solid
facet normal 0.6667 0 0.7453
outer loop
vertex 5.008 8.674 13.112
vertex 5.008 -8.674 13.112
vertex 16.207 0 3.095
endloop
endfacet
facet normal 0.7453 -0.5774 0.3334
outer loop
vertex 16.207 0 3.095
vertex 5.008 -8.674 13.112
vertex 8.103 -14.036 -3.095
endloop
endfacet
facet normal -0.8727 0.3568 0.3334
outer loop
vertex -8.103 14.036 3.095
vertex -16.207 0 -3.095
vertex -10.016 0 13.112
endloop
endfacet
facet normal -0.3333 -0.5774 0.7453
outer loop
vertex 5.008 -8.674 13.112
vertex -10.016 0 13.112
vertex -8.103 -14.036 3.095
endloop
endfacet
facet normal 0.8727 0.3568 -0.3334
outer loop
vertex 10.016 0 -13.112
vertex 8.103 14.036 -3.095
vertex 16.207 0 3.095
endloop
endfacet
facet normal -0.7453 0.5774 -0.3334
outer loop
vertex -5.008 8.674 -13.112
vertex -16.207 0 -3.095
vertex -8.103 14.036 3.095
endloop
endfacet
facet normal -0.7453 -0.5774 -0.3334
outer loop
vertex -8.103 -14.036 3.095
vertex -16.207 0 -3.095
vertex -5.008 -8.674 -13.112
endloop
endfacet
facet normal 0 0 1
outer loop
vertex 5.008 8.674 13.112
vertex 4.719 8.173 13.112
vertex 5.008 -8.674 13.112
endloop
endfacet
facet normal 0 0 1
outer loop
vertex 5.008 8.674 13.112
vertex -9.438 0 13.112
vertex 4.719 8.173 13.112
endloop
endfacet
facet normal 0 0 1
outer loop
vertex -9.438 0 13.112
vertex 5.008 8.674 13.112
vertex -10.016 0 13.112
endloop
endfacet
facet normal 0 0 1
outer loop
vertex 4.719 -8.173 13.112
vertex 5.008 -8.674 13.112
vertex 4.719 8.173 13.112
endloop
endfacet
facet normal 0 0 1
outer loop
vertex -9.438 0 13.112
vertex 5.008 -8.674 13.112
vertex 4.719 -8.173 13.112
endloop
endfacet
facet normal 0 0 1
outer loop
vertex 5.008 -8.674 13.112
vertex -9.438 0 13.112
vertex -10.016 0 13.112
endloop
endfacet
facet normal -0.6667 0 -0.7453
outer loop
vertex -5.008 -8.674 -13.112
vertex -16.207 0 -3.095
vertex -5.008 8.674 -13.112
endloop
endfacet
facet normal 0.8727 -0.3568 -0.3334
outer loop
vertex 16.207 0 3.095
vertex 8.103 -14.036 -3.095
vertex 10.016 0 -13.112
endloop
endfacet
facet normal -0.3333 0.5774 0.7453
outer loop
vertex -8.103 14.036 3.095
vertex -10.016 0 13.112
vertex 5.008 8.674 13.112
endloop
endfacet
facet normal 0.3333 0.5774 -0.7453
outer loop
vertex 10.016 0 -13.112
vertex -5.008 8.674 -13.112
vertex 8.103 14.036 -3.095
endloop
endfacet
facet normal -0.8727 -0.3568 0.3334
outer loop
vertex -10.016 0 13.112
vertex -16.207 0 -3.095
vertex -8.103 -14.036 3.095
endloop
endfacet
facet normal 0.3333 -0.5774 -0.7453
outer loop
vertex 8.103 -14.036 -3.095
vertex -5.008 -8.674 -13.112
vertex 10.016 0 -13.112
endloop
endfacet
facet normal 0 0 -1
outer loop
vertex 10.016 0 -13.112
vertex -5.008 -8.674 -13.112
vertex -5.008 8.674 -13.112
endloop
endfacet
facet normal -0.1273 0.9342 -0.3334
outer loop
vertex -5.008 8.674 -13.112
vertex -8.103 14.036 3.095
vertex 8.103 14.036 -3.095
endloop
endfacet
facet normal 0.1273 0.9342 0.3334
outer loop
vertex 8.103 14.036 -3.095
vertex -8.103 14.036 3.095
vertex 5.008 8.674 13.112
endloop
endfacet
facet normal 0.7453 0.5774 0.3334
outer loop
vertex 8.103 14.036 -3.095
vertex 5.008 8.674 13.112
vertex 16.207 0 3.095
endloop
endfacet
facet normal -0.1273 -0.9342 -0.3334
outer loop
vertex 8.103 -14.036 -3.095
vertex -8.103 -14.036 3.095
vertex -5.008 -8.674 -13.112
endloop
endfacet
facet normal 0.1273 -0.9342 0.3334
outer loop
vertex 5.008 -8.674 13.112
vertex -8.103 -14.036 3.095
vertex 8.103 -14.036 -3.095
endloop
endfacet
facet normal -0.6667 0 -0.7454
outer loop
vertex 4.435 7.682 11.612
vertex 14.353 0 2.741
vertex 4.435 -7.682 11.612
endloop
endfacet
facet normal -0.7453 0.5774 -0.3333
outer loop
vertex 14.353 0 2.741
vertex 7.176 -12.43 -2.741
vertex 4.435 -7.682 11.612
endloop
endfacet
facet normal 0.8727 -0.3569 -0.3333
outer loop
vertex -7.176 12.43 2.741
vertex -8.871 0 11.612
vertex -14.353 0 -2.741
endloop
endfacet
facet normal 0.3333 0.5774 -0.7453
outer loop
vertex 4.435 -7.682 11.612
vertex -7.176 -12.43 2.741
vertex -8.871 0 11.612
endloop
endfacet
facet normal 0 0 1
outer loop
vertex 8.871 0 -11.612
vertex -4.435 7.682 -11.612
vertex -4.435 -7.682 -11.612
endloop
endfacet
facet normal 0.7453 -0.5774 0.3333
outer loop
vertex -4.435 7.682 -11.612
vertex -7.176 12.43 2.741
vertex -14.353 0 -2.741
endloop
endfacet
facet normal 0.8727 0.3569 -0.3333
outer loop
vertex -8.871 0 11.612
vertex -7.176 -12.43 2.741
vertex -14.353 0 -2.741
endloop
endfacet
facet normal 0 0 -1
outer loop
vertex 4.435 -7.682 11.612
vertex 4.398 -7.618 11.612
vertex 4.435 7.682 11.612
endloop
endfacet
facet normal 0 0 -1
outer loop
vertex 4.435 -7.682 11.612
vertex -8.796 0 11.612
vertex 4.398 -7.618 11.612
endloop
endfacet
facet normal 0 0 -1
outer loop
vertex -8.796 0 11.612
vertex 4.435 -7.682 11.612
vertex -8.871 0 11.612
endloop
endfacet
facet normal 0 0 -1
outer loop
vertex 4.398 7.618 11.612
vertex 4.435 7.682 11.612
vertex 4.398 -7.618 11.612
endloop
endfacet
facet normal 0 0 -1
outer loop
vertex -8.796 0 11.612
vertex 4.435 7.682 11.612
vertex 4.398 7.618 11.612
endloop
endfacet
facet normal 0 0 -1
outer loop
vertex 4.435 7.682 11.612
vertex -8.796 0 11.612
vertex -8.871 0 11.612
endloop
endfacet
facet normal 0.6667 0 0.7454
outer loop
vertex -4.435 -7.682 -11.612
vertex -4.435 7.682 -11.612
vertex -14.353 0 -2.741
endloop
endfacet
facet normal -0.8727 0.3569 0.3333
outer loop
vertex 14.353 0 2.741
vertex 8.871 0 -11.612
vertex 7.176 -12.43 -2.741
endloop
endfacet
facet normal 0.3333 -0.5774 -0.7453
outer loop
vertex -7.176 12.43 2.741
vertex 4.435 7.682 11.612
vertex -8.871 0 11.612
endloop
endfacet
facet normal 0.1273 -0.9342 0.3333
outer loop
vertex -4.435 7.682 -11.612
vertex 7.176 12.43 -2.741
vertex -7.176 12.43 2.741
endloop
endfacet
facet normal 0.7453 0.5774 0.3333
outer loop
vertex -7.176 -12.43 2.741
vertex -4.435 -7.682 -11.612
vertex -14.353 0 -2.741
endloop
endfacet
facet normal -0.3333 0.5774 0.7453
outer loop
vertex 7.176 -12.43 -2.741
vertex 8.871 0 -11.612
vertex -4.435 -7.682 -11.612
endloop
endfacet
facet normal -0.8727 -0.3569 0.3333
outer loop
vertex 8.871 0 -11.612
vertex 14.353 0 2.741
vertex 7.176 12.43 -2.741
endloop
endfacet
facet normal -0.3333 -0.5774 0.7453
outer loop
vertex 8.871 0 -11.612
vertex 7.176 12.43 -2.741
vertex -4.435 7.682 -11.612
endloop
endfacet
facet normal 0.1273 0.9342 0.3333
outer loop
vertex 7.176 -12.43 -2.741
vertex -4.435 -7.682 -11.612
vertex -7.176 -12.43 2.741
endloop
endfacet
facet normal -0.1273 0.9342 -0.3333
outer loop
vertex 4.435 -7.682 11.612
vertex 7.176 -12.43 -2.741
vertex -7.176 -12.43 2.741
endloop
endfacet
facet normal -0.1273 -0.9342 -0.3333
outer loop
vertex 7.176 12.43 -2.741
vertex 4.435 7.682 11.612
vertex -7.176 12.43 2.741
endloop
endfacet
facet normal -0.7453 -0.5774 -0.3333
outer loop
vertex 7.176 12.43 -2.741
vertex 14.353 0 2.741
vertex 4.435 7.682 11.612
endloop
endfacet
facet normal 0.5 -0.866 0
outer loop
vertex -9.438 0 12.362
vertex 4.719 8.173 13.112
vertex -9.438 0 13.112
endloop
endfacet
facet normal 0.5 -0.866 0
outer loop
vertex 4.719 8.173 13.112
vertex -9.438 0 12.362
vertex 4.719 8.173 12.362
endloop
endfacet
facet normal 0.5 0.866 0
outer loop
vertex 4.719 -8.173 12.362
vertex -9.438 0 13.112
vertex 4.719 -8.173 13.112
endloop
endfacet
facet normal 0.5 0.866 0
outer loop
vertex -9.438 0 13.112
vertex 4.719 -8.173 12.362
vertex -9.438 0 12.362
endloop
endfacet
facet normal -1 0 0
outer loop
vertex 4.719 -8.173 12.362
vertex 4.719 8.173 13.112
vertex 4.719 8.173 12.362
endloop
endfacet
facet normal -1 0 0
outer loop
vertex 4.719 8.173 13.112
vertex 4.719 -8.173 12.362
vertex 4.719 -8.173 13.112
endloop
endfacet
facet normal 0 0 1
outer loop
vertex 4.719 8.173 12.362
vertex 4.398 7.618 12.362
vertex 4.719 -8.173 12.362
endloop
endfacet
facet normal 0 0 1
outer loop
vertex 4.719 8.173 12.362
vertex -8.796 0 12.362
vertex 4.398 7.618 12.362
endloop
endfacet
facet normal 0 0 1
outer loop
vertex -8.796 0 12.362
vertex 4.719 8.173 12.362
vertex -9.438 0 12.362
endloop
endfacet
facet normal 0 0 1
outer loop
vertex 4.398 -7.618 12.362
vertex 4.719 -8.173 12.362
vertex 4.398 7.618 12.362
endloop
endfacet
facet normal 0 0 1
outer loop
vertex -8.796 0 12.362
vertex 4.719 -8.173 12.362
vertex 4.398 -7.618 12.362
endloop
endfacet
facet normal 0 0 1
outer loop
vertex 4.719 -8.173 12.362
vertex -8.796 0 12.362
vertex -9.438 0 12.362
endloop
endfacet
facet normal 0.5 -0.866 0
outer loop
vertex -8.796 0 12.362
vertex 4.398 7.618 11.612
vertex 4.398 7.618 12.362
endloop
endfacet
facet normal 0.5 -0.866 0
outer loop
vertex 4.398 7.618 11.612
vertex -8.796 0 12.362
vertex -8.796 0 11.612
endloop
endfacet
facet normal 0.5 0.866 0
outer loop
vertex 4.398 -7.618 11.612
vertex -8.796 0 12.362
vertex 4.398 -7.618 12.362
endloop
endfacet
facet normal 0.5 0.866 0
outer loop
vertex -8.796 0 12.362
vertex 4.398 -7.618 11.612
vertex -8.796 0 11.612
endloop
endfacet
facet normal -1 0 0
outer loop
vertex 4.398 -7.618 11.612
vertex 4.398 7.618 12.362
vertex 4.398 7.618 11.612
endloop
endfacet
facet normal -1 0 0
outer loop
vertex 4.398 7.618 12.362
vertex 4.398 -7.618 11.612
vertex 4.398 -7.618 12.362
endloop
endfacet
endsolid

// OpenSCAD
arete = 17.349;
angle = 20.905;
paroi = 1.5;
echelleReductionAjustementBouchon = 0.935;
r = 0.19; // résolution d'impression sur l'axe Z
ico_sch = [3,5];
Cpi = 3.14159;
Cphi = (1+sqrt(5))/2;
Cepsilon = 0.00000001;

function ico_ext_radius(a) = 
    a*1/4*(sqrt(10+2*sqrt(5)));
    
function ico_int_radius(a) = 
    a/12*(3*sqrt(3)+sqrt(15));
    
function ico_arete_from(int_radius) = 
    int_radius*12/(3*sqrt(3)+sqrt(15));
    
externalRadius = ico_ext_radius(arete);
internalRadius = ico_ext_radius( 
                    ico_arete_from(
                        ico_int_radius(arete)-paroi));
                        
echo(externalRadius); 
echo(internalRadius);

//ico_creux();
//decoupe_bouchon();
corps_ouvert();
//bouchon();
//trou();

module corps_ouvert() {
    //rotate([180, 0, 0])
	difference() {
		ico_creux();
		decoupe_bouchon();
	}
}

module bouchon(version) {
    //rotate([180, 0, 0])
	scale([echelleReductionAjustementBouchon, echelleReductionAjustementBouchon, 0.98])
	difference () {
        intersection() {
            ico_creux();
            decoupe_bouchon(echelleReductionAjustementBouchon);
        }
        // trou centre face
//		translate([0, 0, externalRadius*0.5])
//		cylinder(30, r=diametreTrouBouchon/2, $fn=22);
	}
}

module trou() {
    rotate([0, -37.3, 0])
		translate([0, 0, externalRadius*0.5])
		cylinder(30, r=diametreTrouBouchon/2, $fn=22);
}

module ico_creux() {
	difference() {
        rotate([0, angle, 0]) icosahedron(externalRadius);
        rotate([0, angle, 0]) icosahedron(internalRadius);
	}
}

module decoupe_bouchon(scale=1) {
    distance = ico_int_radius(arete);
	rotate([0,0,60]) translate([0, 0, distance])
		cylinder(paroi, r=arete*0.544, $fn=3, center=true);
	rotate([0,0,60]) translate([0, 0, distance-paroi])
		cylinder(paroi, r=(arete-paroi)*0.555, $fn=3, center=true);
}

module icosahedron(rad=1) {
	Cphi = (1+sqrt(5))/2;

	// Convert spherical to cartesian
	function sph_to_cart(c, rad) = [
		rad*sin(atan2(sqrt(c[0]*c[0]+c[1]*c[1]), c[2]))*cos(atan2(c[1],c[0])),  
		rad*sin(atan2(sqrt(c[0]*c[0]+c[1]*c[1]), c[2]))*sin(atan2(c[1],c[0])),
		rad*cos(atan2(sqrt(c[0]*c[0]+c[1]*c[1]), c[2]))
		];


	//================================================
	//	Icosahedron
	//================================================
	//
	// (0, +-1, +-Cphi)
	// (+-Cphi, 0, +-1)
	// (+-1, +-Cphi, 0)

	function icosa_unit(rad) = [
		sph_to_cart([0, +1, +Cphi], rad), 
		sph_to_cart([0, +1, -Cphi], rad),
		sph_to_cart([0, -1, -Cphi], rad),
		sph_to_cart([0, -1, +Cphi], rad),
		sph_to_cart([+Cphi, 0, +1], rad), 
		sph_to_cart([+Cphi, 0, -1], rad), 
		sph_to_cart([-Cphi, 0, -1], rad),
		sph_to_cart([-Cphi, 0, +1], rad),
		sph_to_cart([+1, +Cphi, 0], rad),
		sph_to_cart([+1, -Cphi, 0], rad), 
		sph_to_cart([-1, -Cphi, 0], rad), 
		sph_to_cart([-1, +Cphi, 0], rad),
		];

	icosa_faces = [ 
		[3,0,4],
		[3,4,9],
		[3,9,10],
		[3,10,7],
		[3,7,0],
		[0,8,4],
		[0,7,11],
		[0,11,8],
		[4,8,5],
		[4,5,9],
		[7,10,6],
		[7,6,11],
		[9,5,2],
		[9,2,10],
		[2,6,10],
		[1,5,8],
		[1,8,11],
		[1,11,6],
		[5,1,2],
		[2,1,6]
		];

	polyhedron(icosa_unit(rad), faces = icosa_faces);
}
